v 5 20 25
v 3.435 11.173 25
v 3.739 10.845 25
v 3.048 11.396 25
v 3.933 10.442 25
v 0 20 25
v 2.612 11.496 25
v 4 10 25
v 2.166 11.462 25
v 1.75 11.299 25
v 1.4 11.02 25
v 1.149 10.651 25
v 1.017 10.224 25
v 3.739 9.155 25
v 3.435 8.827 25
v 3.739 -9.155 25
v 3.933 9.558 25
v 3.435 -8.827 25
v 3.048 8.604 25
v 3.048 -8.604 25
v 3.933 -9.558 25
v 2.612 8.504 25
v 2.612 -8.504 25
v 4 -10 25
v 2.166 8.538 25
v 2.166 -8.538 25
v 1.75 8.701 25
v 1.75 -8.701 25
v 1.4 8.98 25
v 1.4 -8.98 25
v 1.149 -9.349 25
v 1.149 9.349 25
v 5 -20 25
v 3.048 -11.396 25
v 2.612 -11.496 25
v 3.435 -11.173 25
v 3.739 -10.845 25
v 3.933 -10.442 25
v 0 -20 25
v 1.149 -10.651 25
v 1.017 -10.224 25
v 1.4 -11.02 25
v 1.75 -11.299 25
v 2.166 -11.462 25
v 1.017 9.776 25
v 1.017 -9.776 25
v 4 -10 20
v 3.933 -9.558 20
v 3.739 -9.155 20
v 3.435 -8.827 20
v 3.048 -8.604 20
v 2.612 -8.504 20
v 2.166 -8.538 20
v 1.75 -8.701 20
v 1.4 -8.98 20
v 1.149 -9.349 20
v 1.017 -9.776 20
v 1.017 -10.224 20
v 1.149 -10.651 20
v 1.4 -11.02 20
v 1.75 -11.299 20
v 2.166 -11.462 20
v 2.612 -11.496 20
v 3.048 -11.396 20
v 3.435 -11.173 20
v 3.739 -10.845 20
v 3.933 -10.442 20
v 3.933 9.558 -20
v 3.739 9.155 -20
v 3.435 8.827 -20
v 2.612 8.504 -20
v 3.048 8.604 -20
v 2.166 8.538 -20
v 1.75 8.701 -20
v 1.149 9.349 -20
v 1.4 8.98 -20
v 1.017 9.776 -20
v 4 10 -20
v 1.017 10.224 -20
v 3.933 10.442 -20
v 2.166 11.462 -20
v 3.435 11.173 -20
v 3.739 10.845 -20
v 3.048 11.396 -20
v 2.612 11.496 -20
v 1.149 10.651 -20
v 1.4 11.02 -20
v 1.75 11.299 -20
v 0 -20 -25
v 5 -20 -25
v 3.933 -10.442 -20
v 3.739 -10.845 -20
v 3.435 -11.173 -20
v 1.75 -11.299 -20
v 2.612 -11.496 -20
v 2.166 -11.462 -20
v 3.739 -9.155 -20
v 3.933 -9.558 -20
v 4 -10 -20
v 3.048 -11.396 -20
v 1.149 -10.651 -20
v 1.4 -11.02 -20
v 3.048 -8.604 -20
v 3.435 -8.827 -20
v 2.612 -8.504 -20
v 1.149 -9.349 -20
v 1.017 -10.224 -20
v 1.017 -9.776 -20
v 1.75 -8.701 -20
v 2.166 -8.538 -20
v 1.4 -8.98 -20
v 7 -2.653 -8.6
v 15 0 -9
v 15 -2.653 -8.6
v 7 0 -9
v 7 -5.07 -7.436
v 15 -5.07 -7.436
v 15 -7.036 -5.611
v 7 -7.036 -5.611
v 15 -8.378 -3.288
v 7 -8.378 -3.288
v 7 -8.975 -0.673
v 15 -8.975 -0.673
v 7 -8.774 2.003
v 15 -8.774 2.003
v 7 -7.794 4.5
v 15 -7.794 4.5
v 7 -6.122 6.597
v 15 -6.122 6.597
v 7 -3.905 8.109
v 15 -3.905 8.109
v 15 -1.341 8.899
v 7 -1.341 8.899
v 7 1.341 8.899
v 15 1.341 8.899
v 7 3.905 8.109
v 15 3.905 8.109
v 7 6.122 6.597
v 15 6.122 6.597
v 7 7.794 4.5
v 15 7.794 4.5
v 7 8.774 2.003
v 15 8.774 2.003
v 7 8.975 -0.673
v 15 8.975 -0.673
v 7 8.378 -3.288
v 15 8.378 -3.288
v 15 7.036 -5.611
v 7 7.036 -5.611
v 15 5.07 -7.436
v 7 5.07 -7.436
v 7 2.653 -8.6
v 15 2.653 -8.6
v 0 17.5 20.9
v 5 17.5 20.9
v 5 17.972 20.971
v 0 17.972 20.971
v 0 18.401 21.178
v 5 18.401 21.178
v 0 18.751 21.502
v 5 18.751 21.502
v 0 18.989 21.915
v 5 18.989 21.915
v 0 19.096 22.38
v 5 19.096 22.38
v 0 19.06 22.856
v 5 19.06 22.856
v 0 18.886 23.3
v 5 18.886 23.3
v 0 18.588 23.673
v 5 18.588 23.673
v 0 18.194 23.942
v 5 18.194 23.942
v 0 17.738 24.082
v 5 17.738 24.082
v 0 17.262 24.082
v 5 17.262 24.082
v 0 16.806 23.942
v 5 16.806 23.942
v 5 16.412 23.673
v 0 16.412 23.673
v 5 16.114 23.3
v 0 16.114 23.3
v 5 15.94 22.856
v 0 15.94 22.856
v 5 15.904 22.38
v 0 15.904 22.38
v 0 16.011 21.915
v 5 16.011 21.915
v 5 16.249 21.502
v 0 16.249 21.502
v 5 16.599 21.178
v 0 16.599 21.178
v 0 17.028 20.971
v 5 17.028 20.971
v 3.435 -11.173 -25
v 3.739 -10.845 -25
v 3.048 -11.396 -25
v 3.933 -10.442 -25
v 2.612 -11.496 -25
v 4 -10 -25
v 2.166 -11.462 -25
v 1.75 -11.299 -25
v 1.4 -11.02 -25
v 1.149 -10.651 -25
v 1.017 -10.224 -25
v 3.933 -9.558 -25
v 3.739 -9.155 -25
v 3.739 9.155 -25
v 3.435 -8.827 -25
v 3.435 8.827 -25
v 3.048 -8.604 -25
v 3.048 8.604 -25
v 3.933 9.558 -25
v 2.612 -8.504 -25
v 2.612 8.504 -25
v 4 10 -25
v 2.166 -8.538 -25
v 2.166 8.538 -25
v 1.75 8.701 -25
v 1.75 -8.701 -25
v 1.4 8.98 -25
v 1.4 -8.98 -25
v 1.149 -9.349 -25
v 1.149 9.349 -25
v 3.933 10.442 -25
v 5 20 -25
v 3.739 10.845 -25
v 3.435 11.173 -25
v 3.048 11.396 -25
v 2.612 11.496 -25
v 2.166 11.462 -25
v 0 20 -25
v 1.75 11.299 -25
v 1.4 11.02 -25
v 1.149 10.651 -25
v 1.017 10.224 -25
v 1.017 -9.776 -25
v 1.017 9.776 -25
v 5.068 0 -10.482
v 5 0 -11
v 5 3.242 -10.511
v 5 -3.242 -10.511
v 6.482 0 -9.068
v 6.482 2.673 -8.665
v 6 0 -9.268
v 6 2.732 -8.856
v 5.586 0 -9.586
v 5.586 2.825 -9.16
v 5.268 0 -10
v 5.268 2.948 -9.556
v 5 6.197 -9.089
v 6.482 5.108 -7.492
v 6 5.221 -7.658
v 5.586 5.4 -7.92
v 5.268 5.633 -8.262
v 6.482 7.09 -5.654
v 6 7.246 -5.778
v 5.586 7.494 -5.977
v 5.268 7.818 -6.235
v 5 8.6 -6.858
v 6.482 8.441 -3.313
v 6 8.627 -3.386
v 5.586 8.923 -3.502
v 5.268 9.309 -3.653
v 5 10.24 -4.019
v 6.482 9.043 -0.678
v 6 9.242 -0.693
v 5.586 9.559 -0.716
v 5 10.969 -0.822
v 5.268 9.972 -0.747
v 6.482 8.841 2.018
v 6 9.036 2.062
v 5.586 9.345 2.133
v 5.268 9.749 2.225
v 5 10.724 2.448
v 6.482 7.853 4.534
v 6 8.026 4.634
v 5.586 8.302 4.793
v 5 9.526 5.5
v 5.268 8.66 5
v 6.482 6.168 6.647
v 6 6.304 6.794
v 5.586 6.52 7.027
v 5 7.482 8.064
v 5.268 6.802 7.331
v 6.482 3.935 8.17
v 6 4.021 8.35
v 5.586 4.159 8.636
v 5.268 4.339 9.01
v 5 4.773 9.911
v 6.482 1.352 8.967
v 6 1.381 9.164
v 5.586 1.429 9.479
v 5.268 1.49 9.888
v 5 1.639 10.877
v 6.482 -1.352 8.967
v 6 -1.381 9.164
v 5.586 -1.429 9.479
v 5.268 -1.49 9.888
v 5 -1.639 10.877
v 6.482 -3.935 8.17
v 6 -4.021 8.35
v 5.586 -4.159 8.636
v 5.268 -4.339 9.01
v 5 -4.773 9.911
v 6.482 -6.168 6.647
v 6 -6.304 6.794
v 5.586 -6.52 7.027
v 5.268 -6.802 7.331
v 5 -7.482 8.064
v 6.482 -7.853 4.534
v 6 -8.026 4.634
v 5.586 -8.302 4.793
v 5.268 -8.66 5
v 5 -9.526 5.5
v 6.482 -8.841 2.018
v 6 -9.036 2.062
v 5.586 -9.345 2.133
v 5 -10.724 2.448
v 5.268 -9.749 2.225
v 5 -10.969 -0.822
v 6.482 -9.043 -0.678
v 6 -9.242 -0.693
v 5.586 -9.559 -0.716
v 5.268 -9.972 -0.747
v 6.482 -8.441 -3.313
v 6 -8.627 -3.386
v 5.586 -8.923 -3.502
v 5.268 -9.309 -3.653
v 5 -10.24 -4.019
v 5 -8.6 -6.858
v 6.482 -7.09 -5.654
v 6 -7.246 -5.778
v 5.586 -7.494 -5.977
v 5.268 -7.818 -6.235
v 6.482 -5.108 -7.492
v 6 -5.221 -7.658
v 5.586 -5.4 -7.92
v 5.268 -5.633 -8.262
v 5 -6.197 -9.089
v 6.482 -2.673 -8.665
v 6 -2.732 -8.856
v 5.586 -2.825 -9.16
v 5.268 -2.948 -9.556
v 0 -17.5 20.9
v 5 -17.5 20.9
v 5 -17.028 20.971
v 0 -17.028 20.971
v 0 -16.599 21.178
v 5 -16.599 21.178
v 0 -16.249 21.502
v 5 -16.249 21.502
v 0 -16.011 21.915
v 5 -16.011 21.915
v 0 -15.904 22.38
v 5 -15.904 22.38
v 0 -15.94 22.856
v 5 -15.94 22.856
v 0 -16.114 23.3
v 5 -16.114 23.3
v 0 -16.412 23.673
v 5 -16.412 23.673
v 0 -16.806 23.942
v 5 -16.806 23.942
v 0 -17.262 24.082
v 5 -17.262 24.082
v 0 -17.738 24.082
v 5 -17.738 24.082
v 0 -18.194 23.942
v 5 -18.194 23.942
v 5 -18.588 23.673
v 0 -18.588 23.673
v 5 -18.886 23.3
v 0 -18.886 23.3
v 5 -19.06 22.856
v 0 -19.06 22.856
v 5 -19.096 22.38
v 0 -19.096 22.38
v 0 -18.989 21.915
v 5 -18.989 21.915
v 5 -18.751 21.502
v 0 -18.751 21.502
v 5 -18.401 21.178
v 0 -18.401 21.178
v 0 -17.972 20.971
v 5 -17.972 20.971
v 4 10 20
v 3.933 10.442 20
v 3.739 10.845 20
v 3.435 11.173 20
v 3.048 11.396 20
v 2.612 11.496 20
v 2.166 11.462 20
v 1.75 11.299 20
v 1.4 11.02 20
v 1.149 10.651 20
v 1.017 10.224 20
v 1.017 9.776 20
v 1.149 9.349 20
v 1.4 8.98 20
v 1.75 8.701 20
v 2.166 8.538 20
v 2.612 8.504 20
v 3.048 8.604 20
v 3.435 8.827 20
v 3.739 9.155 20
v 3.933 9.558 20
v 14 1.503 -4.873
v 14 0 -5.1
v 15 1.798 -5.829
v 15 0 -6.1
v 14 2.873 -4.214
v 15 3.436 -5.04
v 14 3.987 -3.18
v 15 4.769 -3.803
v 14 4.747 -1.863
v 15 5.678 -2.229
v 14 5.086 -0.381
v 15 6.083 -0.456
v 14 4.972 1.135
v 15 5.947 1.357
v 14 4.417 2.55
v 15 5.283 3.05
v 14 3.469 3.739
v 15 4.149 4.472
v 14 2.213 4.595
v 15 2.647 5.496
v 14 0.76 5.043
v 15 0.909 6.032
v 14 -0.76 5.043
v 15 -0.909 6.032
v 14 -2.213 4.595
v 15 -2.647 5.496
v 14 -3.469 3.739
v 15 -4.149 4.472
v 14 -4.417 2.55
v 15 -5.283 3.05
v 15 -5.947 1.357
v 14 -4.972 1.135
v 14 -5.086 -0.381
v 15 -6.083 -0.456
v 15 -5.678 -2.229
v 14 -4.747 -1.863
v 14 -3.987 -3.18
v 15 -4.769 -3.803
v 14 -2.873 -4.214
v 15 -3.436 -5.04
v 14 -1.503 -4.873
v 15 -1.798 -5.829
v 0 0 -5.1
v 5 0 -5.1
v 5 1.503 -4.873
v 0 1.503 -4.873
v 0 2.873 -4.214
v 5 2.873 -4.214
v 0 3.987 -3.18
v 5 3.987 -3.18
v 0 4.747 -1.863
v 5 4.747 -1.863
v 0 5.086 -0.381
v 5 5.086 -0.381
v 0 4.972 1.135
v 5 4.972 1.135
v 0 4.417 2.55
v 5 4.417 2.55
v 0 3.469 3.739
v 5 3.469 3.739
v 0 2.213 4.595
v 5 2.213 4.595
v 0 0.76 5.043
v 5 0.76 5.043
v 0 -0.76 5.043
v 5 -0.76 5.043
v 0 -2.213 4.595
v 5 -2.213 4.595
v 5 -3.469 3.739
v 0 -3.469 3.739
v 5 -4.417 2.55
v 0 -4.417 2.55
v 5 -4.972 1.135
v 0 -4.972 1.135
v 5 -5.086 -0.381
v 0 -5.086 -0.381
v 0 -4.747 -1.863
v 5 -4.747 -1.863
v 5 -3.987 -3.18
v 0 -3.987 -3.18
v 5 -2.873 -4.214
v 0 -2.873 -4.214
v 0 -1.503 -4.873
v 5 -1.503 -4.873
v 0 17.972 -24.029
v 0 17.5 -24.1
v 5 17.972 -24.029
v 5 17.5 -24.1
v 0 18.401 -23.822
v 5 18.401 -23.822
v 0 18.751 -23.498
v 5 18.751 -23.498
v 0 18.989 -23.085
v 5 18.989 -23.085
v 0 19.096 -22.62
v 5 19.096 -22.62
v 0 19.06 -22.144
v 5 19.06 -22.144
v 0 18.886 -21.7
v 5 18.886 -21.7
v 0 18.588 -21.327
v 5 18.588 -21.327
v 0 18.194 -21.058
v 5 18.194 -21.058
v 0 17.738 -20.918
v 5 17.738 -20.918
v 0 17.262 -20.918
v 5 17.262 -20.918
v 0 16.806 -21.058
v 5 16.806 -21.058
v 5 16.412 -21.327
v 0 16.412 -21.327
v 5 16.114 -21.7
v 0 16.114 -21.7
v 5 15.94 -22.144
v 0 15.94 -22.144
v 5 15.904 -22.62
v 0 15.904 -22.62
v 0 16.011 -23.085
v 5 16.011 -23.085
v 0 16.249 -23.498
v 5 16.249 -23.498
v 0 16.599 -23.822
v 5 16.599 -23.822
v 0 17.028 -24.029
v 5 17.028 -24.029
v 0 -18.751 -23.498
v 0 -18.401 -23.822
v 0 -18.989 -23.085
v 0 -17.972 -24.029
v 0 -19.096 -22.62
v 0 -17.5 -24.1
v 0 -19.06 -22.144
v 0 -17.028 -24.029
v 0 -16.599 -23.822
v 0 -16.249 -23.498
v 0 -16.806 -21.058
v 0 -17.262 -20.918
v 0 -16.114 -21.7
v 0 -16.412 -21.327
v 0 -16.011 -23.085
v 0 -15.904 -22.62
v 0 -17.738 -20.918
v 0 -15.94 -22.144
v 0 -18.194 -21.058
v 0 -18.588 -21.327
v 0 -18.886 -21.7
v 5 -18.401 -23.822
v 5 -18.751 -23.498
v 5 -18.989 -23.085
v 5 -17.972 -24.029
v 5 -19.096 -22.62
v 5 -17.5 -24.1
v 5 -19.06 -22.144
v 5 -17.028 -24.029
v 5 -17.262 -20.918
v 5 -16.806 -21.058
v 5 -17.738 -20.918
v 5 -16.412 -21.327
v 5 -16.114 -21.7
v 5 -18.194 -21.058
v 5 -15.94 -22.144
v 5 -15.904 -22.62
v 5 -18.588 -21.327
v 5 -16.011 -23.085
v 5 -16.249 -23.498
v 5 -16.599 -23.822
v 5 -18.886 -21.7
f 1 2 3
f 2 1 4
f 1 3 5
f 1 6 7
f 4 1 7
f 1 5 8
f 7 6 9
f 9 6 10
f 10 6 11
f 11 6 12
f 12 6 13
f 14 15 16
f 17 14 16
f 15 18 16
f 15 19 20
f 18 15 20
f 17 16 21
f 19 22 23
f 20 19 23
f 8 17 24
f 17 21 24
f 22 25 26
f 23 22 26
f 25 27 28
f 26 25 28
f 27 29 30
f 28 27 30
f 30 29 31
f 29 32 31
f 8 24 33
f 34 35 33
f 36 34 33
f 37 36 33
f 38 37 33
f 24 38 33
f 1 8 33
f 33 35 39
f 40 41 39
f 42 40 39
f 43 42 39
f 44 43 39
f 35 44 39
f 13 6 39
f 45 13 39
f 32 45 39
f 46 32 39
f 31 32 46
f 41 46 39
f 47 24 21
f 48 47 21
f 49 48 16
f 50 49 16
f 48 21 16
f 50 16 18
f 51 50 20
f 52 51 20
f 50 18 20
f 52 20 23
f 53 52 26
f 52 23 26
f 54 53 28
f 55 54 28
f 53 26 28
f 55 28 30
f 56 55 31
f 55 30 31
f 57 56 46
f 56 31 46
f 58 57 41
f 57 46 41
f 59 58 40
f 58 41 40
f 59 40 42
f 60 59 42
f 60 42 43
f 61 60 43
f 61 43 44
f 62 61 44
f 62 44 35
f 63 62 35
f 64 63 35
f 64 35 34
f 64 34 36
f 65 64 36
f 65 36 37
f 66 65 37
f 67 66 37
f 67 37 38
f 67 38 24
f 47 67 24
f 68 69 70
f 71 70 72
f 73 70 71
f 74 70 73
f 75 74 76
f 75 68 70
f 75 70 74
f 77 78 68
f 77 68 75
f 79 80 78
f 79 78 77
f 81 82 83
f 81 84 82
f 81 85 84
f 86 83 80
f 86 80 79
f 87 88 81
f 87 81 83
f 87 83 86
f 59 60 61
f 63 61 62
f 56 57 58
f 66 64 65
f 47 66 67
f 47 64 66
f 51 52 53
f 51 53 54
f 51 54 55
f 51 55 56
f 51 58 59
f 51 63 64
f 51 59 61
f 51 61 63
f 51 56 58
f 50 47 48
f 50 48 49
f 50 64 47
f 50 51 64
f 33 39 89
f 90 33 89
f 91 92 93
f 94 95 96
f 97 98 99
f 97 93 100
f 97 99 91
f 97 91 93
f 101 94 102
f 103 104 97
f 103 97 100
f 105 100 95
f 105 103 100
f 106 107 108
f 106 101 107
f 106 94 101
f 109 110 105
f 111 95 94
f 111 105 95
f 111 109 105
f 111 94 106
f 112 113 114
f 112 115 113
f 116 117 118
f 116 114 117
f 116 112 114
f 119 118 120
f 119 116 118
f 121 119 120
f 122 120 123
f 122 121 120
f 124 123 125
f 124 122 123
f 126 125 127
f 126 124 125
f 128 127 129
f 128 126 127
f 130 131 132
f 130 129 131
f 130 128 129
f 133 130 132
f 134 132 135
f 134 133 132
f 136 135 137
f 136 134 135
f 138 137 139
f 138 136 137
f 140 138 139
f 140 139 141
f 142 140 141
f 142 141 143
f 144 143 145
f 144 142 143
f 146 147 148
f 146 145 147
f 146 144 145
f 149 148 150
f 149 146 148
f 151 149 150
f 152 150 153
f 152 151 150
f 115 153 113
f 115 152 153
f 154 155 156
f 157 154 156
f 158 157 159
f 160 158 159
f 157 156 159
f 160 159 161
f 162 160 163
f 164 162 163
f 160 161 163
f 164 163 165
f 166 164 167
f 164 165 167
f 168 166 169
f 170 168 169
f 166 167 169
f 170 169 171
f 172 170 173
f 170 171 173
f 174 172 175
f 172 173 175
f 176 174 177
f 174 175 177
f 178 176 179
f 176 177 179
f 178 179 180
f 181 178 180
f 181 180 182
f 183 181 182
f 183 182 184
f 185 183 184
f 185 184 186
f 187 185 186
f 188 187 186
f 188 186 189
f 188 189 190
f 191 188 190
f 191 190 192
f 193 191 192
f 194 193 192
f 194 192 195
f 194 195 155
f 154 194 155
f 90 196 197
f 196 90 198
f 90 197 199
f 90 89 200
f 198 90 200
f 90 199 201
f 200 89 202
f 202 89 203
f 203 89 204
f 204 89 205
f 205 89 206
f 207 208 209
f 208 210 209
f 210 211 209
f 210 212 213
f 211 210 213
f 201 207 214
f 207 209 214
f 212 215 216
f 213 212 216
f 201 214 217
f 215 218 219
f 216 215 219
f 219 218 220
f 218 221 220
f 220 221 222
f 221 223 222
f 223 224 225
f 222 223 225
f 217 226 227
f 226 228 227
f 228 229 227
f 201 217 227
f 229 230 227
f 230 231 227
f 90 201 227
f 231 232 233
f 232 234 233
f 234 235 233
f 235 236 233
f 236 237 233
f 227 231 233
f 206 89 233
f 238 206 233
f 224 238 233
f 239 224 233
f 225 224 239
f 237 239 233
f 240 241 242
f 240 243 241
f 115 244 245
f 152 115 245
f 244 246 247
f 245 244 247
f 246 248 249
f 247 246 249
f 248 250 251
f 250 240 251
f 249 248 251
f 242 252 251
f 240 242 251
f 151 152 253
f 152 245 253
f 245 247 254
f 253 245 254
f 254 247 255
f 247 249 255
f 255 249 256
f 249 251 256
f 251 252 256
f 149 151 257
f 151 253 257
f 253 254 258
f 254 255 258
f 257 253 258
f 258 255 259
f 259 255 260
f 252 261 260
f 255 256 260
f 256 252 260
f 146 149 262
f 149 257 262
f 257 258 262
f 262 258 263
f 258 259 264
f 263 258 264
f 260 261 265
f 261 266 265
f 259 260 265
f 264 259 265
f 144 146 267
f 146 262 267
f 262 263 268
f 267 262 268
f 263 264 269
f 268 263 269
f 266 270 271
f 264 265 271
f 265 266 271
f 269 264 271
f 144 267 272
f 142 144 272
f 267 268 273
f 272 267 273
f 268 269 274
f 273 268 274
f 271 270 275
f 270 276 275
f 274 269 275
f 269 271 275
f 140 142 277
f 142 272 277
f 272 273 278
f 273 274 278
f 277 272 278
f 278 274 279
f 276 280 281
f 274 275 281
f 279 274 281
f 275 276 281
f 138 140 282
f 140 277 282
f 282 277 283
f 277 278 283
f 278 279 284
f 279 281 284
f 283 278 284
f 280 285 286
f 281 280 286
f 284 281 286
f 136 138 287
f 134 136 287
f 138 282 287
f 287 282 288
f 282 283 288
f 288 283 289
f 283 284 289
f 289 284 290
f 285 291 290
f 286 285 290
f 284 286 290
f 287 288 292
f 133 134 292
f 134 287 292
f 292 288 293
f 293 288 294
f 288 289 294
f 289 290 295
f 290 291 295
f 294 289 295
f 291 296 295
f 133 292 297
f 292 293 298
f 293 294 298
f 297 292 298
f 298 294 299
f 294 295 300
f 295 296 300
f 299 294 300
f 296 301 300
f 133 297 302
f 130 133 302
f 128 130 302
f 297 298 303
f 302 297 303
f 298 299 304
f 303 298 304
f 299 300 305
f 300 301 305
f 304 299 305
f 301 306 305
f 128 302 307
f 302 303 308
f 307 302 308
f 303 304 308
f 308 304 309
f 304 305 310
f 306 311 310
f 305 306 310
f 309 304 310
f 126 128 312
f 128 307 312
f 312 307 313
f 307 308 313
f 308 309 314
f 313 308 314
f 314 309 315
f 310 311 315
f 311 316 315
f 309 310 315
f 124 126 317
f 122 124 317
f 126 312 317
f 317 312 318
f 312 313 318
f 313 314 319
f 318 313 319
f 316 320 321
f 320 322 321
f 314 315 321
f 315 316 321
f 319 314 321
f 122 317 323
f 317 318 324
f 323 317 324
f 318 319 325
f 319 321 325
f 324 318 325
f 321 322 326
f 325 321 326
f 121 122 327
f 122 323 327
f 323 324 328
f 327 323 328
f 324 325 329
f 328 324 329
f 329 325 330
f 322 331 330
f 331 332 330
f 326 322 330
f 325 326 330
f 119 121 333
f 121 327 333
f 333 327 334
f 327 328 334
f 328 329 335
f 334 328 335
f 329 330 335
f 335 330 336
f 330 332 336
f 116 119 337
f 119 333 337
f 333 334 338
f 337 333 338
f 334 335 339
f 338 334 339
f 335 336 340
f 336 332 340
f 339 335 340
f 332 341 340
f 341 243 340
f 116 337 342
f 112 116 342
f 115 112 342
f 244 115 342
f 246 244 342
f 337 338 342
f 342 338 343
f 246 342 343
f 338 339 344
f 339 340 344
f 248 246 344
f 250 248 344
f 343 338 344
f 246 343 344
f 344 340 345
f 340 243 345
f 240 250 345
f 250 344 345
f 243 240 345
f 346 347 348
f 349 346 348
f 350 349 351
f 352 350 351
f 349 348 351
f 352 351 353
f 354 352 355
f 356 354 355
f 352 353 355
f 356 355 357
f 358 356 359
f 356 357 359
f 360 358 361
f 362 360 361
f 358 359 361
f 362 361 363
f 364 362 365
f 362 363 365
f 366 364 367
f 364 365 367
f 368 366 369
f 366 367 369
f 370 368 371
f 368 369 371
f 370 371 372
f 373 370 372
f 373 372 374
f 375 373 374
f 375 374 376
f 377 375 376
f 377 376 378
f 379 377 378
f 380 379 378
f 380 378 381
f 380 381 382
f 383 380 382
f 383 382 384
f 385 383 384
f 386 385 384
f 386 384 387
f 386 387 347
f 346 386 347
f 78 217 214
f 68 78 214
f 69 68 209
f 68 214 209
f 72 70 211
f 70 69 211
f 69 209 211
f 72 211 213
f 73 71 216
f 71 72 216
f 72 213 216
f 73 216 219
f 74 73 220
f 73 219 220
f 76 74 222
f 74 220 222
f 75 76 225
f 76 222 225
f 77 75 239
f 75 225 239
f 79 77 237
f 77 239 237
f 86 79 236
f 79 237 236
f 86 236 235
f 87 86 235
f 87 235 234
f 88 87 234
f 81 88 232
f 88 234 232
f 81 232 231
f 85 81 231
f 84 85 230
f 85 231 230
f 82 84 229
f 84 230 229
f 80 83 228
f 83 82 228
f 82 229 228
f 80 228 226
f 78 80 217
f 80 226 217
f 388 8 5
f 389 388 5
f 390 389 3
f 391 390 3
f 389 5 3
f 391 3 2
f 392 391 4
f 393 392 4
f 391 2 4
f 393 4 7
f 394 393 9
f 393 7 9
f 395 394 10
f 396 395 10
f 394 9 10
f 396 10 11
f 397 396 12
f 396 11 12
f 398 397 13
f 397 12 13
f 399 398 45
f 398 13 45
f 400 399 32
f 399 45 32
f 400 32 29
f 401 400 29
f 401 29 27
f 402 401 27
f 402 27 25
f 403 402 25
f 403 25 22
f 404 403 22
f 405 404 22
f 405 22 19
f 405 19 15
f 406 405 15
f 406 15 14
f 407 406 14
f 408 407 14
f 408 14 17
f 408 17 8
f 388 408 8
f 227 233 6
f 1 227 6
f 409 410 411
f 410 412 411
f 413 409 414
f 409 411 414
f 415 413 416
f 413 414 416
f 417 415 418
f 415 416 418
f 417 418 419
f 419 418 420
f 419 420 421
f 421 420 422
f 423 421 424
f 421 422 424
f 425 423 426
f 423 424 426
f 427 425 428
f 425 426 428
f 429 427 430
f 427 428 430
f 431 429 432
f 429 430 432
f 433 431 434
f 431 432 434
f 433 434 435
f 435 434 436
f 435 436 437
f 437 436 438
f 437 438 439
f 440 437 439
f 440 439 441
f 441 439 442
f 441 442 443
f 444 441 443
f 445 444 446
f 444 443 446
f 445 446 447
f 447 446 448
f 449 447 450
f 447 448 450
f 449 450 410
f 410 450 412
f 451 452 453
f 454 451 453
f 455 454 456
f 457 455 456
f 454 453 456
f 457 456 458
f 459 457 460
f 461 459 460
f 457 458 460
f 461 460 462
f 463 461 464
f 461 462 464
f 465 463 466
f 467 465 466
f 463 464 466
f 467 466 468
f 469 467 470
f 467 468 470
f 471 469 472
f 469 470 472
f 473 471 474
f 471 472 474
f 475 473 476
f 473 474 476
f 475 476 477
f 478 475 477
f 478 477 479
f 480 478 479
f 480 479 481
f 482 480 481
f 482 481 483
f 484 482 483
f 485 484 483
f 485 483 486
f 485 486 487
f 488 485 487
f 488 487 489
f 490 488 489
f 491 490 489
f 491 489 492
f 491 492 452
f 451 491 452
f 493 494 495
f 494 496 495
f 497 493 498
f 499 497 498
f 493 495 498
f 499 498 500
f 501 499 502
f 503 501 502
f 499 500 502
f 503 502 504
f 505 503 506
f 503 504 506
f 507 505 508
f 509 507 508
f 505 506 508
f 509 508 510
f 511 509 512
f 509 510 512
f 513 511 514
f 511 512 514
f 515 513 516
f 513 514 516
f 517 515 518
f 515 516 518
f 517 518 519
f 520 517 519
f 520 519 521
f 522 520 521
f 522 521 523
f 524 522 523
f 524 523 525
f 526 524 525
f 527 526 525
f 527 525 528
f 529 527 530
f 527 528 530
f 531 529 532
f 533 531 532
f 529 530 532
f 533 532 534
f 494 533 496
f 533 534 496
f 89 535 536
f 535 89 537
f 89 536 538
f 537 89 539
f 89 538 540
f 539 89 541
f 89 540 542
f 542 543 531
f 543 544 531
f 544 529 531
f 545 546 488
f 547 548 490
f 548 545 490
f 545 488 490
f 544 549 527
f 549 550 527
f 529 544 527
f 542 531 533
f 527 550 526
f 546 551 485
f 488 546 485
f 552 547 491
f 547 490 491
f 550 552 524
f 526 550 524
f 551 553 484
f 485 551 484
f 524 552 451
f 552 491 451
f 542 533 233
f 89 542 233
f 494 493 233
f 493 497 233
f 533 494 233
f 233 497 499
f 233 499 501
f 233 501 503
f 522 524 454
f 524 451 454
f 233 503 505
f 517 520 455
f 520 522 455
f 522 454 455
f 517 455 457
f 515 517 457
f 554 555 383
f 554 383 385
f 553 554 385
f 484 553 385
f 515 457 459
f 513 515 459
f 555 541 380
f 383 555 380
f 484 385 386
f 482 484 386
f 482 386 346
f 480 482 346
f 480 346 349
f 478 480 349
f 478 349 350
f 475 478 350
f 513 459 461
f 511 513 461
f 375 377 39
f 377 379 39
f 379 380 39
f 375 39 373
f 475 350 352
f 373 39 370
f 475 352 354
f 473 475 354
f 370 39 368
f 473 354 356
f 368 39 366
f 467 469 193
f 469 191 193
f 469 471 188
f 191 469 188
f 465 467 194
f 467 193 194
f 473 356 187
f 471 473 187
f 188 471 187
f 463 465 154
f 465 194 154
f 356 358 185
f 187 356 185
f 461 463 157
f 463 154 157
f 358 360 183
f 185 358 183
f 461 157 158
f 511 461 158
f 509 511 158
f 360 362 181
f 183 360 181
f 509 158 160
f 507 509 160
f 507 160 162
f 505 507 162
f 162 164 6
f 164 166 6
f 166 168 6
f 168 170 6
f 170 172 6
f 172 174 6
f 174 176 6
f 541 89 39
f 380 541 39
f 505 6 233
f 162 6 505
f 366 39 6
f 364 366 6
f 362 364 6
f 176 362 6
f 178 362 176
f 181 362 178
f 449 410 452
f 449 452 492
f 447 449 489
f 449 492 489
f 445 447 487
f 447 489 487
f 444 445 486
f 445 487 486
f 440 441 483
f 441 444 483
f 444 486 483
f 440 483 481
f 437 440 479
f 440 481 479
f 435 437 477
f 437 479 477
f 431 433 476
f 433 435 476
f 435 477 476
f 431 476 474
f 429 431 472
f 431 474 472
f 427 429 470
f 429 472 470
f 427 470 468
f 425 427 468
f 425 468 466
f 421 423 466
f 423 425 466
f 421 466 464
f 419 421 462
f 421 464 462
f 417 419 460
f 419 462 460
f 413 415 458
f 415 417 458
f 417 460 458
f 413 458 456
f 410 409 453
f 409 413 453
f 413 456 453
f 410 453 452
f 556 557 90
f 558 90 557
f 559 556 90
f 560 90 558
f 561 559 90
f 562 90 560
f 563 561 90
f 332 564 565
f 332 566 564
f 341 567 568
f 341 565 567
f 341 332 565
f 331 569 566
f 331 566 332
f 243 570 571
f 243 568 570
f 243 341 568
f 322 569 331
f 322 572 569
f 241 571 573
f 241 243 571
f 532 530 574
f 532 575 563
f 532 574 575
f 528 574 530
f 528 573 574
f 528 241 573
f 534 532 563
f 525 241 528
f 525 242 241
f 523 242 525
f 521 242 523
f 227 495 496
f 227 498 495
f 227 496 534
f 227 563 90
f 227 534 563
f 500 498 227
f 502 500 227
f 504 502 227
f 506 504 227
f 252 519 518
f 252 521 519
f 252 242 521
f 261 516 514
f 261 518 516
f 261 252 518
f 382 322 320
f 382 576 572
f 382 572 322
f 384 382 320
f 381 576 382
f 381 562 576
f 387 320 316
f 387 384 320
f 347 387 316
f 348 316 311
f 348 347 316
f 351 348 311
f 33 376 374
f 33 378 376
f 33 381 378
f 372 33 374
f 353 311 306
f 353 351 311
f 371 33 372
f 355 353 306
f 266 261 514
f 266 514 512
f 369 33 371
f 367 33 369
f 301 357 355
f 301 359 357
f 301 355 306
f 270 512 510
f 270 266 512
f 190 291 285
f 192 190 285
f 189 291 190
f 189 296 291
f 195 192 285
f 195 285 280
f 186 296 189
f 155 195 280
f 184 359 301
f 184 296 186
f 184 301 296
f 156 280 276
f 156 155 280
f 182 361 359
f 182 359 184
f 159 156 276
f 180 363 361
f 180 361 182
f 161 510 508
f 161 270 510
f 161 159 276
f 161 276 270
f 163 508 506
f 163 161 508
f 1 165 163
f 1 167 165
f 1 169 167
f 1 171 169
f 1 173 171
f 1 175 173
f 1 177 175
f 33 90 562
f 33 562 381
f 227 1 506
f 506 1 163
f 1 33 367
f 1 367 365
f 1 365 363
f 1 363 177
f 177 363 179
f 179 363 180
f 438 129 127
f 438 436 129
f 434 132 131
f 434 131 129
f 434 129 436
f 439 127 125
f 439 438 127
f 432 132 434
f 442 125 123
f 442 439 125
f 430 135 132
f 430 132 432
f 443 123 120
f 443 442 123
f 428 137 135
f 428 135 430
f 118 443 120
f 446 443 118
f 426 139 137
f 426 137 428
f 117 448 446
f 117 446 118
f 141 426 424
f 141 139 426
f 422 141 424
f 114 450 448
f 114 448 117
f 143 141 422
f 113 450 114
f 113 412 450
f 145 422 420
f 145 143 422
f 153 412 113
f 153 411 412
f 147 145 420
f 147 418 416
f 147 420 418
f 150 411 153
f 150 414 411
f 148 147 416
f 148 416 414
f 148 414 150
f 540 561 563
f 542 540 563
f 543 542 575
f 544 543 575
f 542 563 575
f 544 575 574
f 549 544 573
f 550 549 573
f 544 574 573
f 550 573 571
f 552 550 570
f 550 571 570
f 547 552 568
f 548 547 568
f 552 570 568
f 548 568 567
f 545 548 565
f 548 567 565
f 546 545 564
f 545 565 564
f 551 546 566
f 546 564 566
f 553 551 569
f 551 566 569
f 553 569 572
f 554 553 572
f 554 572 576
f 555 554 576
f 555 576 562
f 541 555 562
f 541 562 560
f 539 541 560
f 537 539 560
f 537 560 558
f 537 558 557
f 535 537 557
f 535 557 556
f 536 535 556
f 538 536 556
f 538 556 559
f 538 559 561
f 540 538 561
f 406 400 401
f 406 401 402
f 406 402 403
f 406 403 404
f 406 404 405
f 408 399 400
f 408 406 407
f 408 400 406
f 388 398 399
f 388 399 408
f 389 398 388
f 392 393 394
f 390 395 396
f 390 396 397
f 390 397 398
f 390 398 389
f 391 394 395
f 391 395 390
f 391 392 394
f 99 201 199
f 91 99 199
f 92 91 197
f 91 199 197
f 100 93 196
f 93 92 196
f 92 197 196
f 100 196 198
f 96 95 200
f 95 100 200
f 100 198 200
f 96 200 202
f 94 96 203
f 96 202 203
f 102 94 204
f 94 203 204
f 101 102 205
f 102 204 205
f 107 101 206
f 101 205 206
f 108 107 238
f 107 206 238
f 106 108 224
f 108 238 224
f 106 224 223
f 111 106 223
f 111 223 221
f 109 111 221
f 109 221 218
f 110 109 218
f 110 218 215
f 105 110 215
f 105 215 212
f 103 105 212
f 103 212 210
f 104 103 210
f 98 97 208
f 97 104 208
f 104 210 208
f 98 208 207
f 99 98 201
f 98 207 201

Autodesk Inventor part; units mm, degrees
ref_plane "YZ Plane" through (0, 0, 0) normal (1, 0, 0) x (0, 1, 0)
ref_plane "XZ Plane" through (0, 0, 0) normal (0, 1, 0) x (-1, 0, 0)
ref_plane "XY Plane" through (0, 0, 0) normal (0, 0, 1) x (1, 0, 0)
sketch "Sketch1" plane through (0, 0, 0) normal (1, 0, 0) x (0, 1, 0)
  line L0 (20, 25) -> (-20, 25)
  line L1 (-20, 25) -> (-20, -25)
  line L2 (-20, -25) -> (20, -25)
  line L3 (20, -25) -> (20, 25)
  point P0 (0, 0)
  dimension "d0" = 40
  dimension "d1" = 50
  dimension "d2" = 20
  dimension "d3" = 25
extrude "Extrusion1" add sketch "Sketch1" along normal blind 5
sketch "Sketch2" plane through (5, 0, 0) normal (1, 0, 0) x (0, 0, -1)
  circle A0 centre (0, 0) radius 5.1
  dimension "d6" = 10.2
extrude "Extrusion2" cut sketch "Sketch2" against normal through all
sketch "Sketch3" plane through (5, 0, 0) normal (1, 0, 0) x (0, 0, -1)
  circle A0 centre (0, 0) radius 5.1
  circle A1 centre (0, 0) radius 9
  dimension "d9" = 10.2
  dimension "d10" = 18
extrude "Extrusion3" add sketch "Sketch3" along normal blind 10
chamfer "Chamfer1" distance 1 angle 45 1 edges at (15, 0, 5.1)
fillet "Fillet1" radius 2 1 edges at (5, 0, 9)
sketch "Sketch4" plane through (5, 0, 0) normal (1, 0, 0) x (0, 0, -1)
  circle A0 centre (-22.5, 17.5) radius 1.6
  circle A1 centre (22.5, 17.5) radius 1.6
  circle A2 centre (22.5, -17.5) radius 1.6
  circle A3 centre (-22.5, -17.5) radius 1.6
  line L0 (-25, 20) -> (-25, -20) projected
  line L1 (25, 20) -> (-25, 20) projected
  line L2 (25, -20) -> (25, 20) projected
  line L3 (-25, -20) -> (25, -20) projected
  point P0 (0, 0)
  dimension "d17" = 3.2
  dimension "d18" = 3.2
  dimension "d19" = 3.2
  dimension "d20" = 3.2
  dimension "d21" = 2.5
  dimension "d22" = 2.5
  dimension "d23" = 2.5
  dimension "d24" = 2.5
  dimension "d25" = 2.5
  dimension "d26" = 2.5
  dimension "d27" = 2.5
  dimension "d28" = 2.5
extrude "Extrusion4" cut sketch "Sketch4" against normal through all contours A0 | A1 | A2 | A3
sketch "Sketch5" plane through (0, -20, 25) normal (0, 0, 1) x (1, 0, 0)
  circle A0 centre (2.5, 30) radius 1.5
  line L0 (0, 40) -> (0, 0) projected
  circle A1 centre (2.5, 10) radius 1.5
  point P0 (0, 20)
  point P1 (0, 20)
  point P2 (0, 20)
  dimension "d31" = 3
  dimension "d32" = 2.5
  dimension "d33" = 10
  dimension "d34" = 3
  dimension "d35" = 2.5
  dimension "d36" = 10
extrude "Extrusion5" cut sketch "Sketch5" against normal blind 5
mirror "Mirror1" about plane through (0, 0, 0) normal (0, 0, 1) of "Extrusion5"
equation "\"d2\" = 0.5 * d0"
equation "\"d3\" = 0.5 * d1"
properties part number "Handle_Front_End" material "ABS Plastic"
